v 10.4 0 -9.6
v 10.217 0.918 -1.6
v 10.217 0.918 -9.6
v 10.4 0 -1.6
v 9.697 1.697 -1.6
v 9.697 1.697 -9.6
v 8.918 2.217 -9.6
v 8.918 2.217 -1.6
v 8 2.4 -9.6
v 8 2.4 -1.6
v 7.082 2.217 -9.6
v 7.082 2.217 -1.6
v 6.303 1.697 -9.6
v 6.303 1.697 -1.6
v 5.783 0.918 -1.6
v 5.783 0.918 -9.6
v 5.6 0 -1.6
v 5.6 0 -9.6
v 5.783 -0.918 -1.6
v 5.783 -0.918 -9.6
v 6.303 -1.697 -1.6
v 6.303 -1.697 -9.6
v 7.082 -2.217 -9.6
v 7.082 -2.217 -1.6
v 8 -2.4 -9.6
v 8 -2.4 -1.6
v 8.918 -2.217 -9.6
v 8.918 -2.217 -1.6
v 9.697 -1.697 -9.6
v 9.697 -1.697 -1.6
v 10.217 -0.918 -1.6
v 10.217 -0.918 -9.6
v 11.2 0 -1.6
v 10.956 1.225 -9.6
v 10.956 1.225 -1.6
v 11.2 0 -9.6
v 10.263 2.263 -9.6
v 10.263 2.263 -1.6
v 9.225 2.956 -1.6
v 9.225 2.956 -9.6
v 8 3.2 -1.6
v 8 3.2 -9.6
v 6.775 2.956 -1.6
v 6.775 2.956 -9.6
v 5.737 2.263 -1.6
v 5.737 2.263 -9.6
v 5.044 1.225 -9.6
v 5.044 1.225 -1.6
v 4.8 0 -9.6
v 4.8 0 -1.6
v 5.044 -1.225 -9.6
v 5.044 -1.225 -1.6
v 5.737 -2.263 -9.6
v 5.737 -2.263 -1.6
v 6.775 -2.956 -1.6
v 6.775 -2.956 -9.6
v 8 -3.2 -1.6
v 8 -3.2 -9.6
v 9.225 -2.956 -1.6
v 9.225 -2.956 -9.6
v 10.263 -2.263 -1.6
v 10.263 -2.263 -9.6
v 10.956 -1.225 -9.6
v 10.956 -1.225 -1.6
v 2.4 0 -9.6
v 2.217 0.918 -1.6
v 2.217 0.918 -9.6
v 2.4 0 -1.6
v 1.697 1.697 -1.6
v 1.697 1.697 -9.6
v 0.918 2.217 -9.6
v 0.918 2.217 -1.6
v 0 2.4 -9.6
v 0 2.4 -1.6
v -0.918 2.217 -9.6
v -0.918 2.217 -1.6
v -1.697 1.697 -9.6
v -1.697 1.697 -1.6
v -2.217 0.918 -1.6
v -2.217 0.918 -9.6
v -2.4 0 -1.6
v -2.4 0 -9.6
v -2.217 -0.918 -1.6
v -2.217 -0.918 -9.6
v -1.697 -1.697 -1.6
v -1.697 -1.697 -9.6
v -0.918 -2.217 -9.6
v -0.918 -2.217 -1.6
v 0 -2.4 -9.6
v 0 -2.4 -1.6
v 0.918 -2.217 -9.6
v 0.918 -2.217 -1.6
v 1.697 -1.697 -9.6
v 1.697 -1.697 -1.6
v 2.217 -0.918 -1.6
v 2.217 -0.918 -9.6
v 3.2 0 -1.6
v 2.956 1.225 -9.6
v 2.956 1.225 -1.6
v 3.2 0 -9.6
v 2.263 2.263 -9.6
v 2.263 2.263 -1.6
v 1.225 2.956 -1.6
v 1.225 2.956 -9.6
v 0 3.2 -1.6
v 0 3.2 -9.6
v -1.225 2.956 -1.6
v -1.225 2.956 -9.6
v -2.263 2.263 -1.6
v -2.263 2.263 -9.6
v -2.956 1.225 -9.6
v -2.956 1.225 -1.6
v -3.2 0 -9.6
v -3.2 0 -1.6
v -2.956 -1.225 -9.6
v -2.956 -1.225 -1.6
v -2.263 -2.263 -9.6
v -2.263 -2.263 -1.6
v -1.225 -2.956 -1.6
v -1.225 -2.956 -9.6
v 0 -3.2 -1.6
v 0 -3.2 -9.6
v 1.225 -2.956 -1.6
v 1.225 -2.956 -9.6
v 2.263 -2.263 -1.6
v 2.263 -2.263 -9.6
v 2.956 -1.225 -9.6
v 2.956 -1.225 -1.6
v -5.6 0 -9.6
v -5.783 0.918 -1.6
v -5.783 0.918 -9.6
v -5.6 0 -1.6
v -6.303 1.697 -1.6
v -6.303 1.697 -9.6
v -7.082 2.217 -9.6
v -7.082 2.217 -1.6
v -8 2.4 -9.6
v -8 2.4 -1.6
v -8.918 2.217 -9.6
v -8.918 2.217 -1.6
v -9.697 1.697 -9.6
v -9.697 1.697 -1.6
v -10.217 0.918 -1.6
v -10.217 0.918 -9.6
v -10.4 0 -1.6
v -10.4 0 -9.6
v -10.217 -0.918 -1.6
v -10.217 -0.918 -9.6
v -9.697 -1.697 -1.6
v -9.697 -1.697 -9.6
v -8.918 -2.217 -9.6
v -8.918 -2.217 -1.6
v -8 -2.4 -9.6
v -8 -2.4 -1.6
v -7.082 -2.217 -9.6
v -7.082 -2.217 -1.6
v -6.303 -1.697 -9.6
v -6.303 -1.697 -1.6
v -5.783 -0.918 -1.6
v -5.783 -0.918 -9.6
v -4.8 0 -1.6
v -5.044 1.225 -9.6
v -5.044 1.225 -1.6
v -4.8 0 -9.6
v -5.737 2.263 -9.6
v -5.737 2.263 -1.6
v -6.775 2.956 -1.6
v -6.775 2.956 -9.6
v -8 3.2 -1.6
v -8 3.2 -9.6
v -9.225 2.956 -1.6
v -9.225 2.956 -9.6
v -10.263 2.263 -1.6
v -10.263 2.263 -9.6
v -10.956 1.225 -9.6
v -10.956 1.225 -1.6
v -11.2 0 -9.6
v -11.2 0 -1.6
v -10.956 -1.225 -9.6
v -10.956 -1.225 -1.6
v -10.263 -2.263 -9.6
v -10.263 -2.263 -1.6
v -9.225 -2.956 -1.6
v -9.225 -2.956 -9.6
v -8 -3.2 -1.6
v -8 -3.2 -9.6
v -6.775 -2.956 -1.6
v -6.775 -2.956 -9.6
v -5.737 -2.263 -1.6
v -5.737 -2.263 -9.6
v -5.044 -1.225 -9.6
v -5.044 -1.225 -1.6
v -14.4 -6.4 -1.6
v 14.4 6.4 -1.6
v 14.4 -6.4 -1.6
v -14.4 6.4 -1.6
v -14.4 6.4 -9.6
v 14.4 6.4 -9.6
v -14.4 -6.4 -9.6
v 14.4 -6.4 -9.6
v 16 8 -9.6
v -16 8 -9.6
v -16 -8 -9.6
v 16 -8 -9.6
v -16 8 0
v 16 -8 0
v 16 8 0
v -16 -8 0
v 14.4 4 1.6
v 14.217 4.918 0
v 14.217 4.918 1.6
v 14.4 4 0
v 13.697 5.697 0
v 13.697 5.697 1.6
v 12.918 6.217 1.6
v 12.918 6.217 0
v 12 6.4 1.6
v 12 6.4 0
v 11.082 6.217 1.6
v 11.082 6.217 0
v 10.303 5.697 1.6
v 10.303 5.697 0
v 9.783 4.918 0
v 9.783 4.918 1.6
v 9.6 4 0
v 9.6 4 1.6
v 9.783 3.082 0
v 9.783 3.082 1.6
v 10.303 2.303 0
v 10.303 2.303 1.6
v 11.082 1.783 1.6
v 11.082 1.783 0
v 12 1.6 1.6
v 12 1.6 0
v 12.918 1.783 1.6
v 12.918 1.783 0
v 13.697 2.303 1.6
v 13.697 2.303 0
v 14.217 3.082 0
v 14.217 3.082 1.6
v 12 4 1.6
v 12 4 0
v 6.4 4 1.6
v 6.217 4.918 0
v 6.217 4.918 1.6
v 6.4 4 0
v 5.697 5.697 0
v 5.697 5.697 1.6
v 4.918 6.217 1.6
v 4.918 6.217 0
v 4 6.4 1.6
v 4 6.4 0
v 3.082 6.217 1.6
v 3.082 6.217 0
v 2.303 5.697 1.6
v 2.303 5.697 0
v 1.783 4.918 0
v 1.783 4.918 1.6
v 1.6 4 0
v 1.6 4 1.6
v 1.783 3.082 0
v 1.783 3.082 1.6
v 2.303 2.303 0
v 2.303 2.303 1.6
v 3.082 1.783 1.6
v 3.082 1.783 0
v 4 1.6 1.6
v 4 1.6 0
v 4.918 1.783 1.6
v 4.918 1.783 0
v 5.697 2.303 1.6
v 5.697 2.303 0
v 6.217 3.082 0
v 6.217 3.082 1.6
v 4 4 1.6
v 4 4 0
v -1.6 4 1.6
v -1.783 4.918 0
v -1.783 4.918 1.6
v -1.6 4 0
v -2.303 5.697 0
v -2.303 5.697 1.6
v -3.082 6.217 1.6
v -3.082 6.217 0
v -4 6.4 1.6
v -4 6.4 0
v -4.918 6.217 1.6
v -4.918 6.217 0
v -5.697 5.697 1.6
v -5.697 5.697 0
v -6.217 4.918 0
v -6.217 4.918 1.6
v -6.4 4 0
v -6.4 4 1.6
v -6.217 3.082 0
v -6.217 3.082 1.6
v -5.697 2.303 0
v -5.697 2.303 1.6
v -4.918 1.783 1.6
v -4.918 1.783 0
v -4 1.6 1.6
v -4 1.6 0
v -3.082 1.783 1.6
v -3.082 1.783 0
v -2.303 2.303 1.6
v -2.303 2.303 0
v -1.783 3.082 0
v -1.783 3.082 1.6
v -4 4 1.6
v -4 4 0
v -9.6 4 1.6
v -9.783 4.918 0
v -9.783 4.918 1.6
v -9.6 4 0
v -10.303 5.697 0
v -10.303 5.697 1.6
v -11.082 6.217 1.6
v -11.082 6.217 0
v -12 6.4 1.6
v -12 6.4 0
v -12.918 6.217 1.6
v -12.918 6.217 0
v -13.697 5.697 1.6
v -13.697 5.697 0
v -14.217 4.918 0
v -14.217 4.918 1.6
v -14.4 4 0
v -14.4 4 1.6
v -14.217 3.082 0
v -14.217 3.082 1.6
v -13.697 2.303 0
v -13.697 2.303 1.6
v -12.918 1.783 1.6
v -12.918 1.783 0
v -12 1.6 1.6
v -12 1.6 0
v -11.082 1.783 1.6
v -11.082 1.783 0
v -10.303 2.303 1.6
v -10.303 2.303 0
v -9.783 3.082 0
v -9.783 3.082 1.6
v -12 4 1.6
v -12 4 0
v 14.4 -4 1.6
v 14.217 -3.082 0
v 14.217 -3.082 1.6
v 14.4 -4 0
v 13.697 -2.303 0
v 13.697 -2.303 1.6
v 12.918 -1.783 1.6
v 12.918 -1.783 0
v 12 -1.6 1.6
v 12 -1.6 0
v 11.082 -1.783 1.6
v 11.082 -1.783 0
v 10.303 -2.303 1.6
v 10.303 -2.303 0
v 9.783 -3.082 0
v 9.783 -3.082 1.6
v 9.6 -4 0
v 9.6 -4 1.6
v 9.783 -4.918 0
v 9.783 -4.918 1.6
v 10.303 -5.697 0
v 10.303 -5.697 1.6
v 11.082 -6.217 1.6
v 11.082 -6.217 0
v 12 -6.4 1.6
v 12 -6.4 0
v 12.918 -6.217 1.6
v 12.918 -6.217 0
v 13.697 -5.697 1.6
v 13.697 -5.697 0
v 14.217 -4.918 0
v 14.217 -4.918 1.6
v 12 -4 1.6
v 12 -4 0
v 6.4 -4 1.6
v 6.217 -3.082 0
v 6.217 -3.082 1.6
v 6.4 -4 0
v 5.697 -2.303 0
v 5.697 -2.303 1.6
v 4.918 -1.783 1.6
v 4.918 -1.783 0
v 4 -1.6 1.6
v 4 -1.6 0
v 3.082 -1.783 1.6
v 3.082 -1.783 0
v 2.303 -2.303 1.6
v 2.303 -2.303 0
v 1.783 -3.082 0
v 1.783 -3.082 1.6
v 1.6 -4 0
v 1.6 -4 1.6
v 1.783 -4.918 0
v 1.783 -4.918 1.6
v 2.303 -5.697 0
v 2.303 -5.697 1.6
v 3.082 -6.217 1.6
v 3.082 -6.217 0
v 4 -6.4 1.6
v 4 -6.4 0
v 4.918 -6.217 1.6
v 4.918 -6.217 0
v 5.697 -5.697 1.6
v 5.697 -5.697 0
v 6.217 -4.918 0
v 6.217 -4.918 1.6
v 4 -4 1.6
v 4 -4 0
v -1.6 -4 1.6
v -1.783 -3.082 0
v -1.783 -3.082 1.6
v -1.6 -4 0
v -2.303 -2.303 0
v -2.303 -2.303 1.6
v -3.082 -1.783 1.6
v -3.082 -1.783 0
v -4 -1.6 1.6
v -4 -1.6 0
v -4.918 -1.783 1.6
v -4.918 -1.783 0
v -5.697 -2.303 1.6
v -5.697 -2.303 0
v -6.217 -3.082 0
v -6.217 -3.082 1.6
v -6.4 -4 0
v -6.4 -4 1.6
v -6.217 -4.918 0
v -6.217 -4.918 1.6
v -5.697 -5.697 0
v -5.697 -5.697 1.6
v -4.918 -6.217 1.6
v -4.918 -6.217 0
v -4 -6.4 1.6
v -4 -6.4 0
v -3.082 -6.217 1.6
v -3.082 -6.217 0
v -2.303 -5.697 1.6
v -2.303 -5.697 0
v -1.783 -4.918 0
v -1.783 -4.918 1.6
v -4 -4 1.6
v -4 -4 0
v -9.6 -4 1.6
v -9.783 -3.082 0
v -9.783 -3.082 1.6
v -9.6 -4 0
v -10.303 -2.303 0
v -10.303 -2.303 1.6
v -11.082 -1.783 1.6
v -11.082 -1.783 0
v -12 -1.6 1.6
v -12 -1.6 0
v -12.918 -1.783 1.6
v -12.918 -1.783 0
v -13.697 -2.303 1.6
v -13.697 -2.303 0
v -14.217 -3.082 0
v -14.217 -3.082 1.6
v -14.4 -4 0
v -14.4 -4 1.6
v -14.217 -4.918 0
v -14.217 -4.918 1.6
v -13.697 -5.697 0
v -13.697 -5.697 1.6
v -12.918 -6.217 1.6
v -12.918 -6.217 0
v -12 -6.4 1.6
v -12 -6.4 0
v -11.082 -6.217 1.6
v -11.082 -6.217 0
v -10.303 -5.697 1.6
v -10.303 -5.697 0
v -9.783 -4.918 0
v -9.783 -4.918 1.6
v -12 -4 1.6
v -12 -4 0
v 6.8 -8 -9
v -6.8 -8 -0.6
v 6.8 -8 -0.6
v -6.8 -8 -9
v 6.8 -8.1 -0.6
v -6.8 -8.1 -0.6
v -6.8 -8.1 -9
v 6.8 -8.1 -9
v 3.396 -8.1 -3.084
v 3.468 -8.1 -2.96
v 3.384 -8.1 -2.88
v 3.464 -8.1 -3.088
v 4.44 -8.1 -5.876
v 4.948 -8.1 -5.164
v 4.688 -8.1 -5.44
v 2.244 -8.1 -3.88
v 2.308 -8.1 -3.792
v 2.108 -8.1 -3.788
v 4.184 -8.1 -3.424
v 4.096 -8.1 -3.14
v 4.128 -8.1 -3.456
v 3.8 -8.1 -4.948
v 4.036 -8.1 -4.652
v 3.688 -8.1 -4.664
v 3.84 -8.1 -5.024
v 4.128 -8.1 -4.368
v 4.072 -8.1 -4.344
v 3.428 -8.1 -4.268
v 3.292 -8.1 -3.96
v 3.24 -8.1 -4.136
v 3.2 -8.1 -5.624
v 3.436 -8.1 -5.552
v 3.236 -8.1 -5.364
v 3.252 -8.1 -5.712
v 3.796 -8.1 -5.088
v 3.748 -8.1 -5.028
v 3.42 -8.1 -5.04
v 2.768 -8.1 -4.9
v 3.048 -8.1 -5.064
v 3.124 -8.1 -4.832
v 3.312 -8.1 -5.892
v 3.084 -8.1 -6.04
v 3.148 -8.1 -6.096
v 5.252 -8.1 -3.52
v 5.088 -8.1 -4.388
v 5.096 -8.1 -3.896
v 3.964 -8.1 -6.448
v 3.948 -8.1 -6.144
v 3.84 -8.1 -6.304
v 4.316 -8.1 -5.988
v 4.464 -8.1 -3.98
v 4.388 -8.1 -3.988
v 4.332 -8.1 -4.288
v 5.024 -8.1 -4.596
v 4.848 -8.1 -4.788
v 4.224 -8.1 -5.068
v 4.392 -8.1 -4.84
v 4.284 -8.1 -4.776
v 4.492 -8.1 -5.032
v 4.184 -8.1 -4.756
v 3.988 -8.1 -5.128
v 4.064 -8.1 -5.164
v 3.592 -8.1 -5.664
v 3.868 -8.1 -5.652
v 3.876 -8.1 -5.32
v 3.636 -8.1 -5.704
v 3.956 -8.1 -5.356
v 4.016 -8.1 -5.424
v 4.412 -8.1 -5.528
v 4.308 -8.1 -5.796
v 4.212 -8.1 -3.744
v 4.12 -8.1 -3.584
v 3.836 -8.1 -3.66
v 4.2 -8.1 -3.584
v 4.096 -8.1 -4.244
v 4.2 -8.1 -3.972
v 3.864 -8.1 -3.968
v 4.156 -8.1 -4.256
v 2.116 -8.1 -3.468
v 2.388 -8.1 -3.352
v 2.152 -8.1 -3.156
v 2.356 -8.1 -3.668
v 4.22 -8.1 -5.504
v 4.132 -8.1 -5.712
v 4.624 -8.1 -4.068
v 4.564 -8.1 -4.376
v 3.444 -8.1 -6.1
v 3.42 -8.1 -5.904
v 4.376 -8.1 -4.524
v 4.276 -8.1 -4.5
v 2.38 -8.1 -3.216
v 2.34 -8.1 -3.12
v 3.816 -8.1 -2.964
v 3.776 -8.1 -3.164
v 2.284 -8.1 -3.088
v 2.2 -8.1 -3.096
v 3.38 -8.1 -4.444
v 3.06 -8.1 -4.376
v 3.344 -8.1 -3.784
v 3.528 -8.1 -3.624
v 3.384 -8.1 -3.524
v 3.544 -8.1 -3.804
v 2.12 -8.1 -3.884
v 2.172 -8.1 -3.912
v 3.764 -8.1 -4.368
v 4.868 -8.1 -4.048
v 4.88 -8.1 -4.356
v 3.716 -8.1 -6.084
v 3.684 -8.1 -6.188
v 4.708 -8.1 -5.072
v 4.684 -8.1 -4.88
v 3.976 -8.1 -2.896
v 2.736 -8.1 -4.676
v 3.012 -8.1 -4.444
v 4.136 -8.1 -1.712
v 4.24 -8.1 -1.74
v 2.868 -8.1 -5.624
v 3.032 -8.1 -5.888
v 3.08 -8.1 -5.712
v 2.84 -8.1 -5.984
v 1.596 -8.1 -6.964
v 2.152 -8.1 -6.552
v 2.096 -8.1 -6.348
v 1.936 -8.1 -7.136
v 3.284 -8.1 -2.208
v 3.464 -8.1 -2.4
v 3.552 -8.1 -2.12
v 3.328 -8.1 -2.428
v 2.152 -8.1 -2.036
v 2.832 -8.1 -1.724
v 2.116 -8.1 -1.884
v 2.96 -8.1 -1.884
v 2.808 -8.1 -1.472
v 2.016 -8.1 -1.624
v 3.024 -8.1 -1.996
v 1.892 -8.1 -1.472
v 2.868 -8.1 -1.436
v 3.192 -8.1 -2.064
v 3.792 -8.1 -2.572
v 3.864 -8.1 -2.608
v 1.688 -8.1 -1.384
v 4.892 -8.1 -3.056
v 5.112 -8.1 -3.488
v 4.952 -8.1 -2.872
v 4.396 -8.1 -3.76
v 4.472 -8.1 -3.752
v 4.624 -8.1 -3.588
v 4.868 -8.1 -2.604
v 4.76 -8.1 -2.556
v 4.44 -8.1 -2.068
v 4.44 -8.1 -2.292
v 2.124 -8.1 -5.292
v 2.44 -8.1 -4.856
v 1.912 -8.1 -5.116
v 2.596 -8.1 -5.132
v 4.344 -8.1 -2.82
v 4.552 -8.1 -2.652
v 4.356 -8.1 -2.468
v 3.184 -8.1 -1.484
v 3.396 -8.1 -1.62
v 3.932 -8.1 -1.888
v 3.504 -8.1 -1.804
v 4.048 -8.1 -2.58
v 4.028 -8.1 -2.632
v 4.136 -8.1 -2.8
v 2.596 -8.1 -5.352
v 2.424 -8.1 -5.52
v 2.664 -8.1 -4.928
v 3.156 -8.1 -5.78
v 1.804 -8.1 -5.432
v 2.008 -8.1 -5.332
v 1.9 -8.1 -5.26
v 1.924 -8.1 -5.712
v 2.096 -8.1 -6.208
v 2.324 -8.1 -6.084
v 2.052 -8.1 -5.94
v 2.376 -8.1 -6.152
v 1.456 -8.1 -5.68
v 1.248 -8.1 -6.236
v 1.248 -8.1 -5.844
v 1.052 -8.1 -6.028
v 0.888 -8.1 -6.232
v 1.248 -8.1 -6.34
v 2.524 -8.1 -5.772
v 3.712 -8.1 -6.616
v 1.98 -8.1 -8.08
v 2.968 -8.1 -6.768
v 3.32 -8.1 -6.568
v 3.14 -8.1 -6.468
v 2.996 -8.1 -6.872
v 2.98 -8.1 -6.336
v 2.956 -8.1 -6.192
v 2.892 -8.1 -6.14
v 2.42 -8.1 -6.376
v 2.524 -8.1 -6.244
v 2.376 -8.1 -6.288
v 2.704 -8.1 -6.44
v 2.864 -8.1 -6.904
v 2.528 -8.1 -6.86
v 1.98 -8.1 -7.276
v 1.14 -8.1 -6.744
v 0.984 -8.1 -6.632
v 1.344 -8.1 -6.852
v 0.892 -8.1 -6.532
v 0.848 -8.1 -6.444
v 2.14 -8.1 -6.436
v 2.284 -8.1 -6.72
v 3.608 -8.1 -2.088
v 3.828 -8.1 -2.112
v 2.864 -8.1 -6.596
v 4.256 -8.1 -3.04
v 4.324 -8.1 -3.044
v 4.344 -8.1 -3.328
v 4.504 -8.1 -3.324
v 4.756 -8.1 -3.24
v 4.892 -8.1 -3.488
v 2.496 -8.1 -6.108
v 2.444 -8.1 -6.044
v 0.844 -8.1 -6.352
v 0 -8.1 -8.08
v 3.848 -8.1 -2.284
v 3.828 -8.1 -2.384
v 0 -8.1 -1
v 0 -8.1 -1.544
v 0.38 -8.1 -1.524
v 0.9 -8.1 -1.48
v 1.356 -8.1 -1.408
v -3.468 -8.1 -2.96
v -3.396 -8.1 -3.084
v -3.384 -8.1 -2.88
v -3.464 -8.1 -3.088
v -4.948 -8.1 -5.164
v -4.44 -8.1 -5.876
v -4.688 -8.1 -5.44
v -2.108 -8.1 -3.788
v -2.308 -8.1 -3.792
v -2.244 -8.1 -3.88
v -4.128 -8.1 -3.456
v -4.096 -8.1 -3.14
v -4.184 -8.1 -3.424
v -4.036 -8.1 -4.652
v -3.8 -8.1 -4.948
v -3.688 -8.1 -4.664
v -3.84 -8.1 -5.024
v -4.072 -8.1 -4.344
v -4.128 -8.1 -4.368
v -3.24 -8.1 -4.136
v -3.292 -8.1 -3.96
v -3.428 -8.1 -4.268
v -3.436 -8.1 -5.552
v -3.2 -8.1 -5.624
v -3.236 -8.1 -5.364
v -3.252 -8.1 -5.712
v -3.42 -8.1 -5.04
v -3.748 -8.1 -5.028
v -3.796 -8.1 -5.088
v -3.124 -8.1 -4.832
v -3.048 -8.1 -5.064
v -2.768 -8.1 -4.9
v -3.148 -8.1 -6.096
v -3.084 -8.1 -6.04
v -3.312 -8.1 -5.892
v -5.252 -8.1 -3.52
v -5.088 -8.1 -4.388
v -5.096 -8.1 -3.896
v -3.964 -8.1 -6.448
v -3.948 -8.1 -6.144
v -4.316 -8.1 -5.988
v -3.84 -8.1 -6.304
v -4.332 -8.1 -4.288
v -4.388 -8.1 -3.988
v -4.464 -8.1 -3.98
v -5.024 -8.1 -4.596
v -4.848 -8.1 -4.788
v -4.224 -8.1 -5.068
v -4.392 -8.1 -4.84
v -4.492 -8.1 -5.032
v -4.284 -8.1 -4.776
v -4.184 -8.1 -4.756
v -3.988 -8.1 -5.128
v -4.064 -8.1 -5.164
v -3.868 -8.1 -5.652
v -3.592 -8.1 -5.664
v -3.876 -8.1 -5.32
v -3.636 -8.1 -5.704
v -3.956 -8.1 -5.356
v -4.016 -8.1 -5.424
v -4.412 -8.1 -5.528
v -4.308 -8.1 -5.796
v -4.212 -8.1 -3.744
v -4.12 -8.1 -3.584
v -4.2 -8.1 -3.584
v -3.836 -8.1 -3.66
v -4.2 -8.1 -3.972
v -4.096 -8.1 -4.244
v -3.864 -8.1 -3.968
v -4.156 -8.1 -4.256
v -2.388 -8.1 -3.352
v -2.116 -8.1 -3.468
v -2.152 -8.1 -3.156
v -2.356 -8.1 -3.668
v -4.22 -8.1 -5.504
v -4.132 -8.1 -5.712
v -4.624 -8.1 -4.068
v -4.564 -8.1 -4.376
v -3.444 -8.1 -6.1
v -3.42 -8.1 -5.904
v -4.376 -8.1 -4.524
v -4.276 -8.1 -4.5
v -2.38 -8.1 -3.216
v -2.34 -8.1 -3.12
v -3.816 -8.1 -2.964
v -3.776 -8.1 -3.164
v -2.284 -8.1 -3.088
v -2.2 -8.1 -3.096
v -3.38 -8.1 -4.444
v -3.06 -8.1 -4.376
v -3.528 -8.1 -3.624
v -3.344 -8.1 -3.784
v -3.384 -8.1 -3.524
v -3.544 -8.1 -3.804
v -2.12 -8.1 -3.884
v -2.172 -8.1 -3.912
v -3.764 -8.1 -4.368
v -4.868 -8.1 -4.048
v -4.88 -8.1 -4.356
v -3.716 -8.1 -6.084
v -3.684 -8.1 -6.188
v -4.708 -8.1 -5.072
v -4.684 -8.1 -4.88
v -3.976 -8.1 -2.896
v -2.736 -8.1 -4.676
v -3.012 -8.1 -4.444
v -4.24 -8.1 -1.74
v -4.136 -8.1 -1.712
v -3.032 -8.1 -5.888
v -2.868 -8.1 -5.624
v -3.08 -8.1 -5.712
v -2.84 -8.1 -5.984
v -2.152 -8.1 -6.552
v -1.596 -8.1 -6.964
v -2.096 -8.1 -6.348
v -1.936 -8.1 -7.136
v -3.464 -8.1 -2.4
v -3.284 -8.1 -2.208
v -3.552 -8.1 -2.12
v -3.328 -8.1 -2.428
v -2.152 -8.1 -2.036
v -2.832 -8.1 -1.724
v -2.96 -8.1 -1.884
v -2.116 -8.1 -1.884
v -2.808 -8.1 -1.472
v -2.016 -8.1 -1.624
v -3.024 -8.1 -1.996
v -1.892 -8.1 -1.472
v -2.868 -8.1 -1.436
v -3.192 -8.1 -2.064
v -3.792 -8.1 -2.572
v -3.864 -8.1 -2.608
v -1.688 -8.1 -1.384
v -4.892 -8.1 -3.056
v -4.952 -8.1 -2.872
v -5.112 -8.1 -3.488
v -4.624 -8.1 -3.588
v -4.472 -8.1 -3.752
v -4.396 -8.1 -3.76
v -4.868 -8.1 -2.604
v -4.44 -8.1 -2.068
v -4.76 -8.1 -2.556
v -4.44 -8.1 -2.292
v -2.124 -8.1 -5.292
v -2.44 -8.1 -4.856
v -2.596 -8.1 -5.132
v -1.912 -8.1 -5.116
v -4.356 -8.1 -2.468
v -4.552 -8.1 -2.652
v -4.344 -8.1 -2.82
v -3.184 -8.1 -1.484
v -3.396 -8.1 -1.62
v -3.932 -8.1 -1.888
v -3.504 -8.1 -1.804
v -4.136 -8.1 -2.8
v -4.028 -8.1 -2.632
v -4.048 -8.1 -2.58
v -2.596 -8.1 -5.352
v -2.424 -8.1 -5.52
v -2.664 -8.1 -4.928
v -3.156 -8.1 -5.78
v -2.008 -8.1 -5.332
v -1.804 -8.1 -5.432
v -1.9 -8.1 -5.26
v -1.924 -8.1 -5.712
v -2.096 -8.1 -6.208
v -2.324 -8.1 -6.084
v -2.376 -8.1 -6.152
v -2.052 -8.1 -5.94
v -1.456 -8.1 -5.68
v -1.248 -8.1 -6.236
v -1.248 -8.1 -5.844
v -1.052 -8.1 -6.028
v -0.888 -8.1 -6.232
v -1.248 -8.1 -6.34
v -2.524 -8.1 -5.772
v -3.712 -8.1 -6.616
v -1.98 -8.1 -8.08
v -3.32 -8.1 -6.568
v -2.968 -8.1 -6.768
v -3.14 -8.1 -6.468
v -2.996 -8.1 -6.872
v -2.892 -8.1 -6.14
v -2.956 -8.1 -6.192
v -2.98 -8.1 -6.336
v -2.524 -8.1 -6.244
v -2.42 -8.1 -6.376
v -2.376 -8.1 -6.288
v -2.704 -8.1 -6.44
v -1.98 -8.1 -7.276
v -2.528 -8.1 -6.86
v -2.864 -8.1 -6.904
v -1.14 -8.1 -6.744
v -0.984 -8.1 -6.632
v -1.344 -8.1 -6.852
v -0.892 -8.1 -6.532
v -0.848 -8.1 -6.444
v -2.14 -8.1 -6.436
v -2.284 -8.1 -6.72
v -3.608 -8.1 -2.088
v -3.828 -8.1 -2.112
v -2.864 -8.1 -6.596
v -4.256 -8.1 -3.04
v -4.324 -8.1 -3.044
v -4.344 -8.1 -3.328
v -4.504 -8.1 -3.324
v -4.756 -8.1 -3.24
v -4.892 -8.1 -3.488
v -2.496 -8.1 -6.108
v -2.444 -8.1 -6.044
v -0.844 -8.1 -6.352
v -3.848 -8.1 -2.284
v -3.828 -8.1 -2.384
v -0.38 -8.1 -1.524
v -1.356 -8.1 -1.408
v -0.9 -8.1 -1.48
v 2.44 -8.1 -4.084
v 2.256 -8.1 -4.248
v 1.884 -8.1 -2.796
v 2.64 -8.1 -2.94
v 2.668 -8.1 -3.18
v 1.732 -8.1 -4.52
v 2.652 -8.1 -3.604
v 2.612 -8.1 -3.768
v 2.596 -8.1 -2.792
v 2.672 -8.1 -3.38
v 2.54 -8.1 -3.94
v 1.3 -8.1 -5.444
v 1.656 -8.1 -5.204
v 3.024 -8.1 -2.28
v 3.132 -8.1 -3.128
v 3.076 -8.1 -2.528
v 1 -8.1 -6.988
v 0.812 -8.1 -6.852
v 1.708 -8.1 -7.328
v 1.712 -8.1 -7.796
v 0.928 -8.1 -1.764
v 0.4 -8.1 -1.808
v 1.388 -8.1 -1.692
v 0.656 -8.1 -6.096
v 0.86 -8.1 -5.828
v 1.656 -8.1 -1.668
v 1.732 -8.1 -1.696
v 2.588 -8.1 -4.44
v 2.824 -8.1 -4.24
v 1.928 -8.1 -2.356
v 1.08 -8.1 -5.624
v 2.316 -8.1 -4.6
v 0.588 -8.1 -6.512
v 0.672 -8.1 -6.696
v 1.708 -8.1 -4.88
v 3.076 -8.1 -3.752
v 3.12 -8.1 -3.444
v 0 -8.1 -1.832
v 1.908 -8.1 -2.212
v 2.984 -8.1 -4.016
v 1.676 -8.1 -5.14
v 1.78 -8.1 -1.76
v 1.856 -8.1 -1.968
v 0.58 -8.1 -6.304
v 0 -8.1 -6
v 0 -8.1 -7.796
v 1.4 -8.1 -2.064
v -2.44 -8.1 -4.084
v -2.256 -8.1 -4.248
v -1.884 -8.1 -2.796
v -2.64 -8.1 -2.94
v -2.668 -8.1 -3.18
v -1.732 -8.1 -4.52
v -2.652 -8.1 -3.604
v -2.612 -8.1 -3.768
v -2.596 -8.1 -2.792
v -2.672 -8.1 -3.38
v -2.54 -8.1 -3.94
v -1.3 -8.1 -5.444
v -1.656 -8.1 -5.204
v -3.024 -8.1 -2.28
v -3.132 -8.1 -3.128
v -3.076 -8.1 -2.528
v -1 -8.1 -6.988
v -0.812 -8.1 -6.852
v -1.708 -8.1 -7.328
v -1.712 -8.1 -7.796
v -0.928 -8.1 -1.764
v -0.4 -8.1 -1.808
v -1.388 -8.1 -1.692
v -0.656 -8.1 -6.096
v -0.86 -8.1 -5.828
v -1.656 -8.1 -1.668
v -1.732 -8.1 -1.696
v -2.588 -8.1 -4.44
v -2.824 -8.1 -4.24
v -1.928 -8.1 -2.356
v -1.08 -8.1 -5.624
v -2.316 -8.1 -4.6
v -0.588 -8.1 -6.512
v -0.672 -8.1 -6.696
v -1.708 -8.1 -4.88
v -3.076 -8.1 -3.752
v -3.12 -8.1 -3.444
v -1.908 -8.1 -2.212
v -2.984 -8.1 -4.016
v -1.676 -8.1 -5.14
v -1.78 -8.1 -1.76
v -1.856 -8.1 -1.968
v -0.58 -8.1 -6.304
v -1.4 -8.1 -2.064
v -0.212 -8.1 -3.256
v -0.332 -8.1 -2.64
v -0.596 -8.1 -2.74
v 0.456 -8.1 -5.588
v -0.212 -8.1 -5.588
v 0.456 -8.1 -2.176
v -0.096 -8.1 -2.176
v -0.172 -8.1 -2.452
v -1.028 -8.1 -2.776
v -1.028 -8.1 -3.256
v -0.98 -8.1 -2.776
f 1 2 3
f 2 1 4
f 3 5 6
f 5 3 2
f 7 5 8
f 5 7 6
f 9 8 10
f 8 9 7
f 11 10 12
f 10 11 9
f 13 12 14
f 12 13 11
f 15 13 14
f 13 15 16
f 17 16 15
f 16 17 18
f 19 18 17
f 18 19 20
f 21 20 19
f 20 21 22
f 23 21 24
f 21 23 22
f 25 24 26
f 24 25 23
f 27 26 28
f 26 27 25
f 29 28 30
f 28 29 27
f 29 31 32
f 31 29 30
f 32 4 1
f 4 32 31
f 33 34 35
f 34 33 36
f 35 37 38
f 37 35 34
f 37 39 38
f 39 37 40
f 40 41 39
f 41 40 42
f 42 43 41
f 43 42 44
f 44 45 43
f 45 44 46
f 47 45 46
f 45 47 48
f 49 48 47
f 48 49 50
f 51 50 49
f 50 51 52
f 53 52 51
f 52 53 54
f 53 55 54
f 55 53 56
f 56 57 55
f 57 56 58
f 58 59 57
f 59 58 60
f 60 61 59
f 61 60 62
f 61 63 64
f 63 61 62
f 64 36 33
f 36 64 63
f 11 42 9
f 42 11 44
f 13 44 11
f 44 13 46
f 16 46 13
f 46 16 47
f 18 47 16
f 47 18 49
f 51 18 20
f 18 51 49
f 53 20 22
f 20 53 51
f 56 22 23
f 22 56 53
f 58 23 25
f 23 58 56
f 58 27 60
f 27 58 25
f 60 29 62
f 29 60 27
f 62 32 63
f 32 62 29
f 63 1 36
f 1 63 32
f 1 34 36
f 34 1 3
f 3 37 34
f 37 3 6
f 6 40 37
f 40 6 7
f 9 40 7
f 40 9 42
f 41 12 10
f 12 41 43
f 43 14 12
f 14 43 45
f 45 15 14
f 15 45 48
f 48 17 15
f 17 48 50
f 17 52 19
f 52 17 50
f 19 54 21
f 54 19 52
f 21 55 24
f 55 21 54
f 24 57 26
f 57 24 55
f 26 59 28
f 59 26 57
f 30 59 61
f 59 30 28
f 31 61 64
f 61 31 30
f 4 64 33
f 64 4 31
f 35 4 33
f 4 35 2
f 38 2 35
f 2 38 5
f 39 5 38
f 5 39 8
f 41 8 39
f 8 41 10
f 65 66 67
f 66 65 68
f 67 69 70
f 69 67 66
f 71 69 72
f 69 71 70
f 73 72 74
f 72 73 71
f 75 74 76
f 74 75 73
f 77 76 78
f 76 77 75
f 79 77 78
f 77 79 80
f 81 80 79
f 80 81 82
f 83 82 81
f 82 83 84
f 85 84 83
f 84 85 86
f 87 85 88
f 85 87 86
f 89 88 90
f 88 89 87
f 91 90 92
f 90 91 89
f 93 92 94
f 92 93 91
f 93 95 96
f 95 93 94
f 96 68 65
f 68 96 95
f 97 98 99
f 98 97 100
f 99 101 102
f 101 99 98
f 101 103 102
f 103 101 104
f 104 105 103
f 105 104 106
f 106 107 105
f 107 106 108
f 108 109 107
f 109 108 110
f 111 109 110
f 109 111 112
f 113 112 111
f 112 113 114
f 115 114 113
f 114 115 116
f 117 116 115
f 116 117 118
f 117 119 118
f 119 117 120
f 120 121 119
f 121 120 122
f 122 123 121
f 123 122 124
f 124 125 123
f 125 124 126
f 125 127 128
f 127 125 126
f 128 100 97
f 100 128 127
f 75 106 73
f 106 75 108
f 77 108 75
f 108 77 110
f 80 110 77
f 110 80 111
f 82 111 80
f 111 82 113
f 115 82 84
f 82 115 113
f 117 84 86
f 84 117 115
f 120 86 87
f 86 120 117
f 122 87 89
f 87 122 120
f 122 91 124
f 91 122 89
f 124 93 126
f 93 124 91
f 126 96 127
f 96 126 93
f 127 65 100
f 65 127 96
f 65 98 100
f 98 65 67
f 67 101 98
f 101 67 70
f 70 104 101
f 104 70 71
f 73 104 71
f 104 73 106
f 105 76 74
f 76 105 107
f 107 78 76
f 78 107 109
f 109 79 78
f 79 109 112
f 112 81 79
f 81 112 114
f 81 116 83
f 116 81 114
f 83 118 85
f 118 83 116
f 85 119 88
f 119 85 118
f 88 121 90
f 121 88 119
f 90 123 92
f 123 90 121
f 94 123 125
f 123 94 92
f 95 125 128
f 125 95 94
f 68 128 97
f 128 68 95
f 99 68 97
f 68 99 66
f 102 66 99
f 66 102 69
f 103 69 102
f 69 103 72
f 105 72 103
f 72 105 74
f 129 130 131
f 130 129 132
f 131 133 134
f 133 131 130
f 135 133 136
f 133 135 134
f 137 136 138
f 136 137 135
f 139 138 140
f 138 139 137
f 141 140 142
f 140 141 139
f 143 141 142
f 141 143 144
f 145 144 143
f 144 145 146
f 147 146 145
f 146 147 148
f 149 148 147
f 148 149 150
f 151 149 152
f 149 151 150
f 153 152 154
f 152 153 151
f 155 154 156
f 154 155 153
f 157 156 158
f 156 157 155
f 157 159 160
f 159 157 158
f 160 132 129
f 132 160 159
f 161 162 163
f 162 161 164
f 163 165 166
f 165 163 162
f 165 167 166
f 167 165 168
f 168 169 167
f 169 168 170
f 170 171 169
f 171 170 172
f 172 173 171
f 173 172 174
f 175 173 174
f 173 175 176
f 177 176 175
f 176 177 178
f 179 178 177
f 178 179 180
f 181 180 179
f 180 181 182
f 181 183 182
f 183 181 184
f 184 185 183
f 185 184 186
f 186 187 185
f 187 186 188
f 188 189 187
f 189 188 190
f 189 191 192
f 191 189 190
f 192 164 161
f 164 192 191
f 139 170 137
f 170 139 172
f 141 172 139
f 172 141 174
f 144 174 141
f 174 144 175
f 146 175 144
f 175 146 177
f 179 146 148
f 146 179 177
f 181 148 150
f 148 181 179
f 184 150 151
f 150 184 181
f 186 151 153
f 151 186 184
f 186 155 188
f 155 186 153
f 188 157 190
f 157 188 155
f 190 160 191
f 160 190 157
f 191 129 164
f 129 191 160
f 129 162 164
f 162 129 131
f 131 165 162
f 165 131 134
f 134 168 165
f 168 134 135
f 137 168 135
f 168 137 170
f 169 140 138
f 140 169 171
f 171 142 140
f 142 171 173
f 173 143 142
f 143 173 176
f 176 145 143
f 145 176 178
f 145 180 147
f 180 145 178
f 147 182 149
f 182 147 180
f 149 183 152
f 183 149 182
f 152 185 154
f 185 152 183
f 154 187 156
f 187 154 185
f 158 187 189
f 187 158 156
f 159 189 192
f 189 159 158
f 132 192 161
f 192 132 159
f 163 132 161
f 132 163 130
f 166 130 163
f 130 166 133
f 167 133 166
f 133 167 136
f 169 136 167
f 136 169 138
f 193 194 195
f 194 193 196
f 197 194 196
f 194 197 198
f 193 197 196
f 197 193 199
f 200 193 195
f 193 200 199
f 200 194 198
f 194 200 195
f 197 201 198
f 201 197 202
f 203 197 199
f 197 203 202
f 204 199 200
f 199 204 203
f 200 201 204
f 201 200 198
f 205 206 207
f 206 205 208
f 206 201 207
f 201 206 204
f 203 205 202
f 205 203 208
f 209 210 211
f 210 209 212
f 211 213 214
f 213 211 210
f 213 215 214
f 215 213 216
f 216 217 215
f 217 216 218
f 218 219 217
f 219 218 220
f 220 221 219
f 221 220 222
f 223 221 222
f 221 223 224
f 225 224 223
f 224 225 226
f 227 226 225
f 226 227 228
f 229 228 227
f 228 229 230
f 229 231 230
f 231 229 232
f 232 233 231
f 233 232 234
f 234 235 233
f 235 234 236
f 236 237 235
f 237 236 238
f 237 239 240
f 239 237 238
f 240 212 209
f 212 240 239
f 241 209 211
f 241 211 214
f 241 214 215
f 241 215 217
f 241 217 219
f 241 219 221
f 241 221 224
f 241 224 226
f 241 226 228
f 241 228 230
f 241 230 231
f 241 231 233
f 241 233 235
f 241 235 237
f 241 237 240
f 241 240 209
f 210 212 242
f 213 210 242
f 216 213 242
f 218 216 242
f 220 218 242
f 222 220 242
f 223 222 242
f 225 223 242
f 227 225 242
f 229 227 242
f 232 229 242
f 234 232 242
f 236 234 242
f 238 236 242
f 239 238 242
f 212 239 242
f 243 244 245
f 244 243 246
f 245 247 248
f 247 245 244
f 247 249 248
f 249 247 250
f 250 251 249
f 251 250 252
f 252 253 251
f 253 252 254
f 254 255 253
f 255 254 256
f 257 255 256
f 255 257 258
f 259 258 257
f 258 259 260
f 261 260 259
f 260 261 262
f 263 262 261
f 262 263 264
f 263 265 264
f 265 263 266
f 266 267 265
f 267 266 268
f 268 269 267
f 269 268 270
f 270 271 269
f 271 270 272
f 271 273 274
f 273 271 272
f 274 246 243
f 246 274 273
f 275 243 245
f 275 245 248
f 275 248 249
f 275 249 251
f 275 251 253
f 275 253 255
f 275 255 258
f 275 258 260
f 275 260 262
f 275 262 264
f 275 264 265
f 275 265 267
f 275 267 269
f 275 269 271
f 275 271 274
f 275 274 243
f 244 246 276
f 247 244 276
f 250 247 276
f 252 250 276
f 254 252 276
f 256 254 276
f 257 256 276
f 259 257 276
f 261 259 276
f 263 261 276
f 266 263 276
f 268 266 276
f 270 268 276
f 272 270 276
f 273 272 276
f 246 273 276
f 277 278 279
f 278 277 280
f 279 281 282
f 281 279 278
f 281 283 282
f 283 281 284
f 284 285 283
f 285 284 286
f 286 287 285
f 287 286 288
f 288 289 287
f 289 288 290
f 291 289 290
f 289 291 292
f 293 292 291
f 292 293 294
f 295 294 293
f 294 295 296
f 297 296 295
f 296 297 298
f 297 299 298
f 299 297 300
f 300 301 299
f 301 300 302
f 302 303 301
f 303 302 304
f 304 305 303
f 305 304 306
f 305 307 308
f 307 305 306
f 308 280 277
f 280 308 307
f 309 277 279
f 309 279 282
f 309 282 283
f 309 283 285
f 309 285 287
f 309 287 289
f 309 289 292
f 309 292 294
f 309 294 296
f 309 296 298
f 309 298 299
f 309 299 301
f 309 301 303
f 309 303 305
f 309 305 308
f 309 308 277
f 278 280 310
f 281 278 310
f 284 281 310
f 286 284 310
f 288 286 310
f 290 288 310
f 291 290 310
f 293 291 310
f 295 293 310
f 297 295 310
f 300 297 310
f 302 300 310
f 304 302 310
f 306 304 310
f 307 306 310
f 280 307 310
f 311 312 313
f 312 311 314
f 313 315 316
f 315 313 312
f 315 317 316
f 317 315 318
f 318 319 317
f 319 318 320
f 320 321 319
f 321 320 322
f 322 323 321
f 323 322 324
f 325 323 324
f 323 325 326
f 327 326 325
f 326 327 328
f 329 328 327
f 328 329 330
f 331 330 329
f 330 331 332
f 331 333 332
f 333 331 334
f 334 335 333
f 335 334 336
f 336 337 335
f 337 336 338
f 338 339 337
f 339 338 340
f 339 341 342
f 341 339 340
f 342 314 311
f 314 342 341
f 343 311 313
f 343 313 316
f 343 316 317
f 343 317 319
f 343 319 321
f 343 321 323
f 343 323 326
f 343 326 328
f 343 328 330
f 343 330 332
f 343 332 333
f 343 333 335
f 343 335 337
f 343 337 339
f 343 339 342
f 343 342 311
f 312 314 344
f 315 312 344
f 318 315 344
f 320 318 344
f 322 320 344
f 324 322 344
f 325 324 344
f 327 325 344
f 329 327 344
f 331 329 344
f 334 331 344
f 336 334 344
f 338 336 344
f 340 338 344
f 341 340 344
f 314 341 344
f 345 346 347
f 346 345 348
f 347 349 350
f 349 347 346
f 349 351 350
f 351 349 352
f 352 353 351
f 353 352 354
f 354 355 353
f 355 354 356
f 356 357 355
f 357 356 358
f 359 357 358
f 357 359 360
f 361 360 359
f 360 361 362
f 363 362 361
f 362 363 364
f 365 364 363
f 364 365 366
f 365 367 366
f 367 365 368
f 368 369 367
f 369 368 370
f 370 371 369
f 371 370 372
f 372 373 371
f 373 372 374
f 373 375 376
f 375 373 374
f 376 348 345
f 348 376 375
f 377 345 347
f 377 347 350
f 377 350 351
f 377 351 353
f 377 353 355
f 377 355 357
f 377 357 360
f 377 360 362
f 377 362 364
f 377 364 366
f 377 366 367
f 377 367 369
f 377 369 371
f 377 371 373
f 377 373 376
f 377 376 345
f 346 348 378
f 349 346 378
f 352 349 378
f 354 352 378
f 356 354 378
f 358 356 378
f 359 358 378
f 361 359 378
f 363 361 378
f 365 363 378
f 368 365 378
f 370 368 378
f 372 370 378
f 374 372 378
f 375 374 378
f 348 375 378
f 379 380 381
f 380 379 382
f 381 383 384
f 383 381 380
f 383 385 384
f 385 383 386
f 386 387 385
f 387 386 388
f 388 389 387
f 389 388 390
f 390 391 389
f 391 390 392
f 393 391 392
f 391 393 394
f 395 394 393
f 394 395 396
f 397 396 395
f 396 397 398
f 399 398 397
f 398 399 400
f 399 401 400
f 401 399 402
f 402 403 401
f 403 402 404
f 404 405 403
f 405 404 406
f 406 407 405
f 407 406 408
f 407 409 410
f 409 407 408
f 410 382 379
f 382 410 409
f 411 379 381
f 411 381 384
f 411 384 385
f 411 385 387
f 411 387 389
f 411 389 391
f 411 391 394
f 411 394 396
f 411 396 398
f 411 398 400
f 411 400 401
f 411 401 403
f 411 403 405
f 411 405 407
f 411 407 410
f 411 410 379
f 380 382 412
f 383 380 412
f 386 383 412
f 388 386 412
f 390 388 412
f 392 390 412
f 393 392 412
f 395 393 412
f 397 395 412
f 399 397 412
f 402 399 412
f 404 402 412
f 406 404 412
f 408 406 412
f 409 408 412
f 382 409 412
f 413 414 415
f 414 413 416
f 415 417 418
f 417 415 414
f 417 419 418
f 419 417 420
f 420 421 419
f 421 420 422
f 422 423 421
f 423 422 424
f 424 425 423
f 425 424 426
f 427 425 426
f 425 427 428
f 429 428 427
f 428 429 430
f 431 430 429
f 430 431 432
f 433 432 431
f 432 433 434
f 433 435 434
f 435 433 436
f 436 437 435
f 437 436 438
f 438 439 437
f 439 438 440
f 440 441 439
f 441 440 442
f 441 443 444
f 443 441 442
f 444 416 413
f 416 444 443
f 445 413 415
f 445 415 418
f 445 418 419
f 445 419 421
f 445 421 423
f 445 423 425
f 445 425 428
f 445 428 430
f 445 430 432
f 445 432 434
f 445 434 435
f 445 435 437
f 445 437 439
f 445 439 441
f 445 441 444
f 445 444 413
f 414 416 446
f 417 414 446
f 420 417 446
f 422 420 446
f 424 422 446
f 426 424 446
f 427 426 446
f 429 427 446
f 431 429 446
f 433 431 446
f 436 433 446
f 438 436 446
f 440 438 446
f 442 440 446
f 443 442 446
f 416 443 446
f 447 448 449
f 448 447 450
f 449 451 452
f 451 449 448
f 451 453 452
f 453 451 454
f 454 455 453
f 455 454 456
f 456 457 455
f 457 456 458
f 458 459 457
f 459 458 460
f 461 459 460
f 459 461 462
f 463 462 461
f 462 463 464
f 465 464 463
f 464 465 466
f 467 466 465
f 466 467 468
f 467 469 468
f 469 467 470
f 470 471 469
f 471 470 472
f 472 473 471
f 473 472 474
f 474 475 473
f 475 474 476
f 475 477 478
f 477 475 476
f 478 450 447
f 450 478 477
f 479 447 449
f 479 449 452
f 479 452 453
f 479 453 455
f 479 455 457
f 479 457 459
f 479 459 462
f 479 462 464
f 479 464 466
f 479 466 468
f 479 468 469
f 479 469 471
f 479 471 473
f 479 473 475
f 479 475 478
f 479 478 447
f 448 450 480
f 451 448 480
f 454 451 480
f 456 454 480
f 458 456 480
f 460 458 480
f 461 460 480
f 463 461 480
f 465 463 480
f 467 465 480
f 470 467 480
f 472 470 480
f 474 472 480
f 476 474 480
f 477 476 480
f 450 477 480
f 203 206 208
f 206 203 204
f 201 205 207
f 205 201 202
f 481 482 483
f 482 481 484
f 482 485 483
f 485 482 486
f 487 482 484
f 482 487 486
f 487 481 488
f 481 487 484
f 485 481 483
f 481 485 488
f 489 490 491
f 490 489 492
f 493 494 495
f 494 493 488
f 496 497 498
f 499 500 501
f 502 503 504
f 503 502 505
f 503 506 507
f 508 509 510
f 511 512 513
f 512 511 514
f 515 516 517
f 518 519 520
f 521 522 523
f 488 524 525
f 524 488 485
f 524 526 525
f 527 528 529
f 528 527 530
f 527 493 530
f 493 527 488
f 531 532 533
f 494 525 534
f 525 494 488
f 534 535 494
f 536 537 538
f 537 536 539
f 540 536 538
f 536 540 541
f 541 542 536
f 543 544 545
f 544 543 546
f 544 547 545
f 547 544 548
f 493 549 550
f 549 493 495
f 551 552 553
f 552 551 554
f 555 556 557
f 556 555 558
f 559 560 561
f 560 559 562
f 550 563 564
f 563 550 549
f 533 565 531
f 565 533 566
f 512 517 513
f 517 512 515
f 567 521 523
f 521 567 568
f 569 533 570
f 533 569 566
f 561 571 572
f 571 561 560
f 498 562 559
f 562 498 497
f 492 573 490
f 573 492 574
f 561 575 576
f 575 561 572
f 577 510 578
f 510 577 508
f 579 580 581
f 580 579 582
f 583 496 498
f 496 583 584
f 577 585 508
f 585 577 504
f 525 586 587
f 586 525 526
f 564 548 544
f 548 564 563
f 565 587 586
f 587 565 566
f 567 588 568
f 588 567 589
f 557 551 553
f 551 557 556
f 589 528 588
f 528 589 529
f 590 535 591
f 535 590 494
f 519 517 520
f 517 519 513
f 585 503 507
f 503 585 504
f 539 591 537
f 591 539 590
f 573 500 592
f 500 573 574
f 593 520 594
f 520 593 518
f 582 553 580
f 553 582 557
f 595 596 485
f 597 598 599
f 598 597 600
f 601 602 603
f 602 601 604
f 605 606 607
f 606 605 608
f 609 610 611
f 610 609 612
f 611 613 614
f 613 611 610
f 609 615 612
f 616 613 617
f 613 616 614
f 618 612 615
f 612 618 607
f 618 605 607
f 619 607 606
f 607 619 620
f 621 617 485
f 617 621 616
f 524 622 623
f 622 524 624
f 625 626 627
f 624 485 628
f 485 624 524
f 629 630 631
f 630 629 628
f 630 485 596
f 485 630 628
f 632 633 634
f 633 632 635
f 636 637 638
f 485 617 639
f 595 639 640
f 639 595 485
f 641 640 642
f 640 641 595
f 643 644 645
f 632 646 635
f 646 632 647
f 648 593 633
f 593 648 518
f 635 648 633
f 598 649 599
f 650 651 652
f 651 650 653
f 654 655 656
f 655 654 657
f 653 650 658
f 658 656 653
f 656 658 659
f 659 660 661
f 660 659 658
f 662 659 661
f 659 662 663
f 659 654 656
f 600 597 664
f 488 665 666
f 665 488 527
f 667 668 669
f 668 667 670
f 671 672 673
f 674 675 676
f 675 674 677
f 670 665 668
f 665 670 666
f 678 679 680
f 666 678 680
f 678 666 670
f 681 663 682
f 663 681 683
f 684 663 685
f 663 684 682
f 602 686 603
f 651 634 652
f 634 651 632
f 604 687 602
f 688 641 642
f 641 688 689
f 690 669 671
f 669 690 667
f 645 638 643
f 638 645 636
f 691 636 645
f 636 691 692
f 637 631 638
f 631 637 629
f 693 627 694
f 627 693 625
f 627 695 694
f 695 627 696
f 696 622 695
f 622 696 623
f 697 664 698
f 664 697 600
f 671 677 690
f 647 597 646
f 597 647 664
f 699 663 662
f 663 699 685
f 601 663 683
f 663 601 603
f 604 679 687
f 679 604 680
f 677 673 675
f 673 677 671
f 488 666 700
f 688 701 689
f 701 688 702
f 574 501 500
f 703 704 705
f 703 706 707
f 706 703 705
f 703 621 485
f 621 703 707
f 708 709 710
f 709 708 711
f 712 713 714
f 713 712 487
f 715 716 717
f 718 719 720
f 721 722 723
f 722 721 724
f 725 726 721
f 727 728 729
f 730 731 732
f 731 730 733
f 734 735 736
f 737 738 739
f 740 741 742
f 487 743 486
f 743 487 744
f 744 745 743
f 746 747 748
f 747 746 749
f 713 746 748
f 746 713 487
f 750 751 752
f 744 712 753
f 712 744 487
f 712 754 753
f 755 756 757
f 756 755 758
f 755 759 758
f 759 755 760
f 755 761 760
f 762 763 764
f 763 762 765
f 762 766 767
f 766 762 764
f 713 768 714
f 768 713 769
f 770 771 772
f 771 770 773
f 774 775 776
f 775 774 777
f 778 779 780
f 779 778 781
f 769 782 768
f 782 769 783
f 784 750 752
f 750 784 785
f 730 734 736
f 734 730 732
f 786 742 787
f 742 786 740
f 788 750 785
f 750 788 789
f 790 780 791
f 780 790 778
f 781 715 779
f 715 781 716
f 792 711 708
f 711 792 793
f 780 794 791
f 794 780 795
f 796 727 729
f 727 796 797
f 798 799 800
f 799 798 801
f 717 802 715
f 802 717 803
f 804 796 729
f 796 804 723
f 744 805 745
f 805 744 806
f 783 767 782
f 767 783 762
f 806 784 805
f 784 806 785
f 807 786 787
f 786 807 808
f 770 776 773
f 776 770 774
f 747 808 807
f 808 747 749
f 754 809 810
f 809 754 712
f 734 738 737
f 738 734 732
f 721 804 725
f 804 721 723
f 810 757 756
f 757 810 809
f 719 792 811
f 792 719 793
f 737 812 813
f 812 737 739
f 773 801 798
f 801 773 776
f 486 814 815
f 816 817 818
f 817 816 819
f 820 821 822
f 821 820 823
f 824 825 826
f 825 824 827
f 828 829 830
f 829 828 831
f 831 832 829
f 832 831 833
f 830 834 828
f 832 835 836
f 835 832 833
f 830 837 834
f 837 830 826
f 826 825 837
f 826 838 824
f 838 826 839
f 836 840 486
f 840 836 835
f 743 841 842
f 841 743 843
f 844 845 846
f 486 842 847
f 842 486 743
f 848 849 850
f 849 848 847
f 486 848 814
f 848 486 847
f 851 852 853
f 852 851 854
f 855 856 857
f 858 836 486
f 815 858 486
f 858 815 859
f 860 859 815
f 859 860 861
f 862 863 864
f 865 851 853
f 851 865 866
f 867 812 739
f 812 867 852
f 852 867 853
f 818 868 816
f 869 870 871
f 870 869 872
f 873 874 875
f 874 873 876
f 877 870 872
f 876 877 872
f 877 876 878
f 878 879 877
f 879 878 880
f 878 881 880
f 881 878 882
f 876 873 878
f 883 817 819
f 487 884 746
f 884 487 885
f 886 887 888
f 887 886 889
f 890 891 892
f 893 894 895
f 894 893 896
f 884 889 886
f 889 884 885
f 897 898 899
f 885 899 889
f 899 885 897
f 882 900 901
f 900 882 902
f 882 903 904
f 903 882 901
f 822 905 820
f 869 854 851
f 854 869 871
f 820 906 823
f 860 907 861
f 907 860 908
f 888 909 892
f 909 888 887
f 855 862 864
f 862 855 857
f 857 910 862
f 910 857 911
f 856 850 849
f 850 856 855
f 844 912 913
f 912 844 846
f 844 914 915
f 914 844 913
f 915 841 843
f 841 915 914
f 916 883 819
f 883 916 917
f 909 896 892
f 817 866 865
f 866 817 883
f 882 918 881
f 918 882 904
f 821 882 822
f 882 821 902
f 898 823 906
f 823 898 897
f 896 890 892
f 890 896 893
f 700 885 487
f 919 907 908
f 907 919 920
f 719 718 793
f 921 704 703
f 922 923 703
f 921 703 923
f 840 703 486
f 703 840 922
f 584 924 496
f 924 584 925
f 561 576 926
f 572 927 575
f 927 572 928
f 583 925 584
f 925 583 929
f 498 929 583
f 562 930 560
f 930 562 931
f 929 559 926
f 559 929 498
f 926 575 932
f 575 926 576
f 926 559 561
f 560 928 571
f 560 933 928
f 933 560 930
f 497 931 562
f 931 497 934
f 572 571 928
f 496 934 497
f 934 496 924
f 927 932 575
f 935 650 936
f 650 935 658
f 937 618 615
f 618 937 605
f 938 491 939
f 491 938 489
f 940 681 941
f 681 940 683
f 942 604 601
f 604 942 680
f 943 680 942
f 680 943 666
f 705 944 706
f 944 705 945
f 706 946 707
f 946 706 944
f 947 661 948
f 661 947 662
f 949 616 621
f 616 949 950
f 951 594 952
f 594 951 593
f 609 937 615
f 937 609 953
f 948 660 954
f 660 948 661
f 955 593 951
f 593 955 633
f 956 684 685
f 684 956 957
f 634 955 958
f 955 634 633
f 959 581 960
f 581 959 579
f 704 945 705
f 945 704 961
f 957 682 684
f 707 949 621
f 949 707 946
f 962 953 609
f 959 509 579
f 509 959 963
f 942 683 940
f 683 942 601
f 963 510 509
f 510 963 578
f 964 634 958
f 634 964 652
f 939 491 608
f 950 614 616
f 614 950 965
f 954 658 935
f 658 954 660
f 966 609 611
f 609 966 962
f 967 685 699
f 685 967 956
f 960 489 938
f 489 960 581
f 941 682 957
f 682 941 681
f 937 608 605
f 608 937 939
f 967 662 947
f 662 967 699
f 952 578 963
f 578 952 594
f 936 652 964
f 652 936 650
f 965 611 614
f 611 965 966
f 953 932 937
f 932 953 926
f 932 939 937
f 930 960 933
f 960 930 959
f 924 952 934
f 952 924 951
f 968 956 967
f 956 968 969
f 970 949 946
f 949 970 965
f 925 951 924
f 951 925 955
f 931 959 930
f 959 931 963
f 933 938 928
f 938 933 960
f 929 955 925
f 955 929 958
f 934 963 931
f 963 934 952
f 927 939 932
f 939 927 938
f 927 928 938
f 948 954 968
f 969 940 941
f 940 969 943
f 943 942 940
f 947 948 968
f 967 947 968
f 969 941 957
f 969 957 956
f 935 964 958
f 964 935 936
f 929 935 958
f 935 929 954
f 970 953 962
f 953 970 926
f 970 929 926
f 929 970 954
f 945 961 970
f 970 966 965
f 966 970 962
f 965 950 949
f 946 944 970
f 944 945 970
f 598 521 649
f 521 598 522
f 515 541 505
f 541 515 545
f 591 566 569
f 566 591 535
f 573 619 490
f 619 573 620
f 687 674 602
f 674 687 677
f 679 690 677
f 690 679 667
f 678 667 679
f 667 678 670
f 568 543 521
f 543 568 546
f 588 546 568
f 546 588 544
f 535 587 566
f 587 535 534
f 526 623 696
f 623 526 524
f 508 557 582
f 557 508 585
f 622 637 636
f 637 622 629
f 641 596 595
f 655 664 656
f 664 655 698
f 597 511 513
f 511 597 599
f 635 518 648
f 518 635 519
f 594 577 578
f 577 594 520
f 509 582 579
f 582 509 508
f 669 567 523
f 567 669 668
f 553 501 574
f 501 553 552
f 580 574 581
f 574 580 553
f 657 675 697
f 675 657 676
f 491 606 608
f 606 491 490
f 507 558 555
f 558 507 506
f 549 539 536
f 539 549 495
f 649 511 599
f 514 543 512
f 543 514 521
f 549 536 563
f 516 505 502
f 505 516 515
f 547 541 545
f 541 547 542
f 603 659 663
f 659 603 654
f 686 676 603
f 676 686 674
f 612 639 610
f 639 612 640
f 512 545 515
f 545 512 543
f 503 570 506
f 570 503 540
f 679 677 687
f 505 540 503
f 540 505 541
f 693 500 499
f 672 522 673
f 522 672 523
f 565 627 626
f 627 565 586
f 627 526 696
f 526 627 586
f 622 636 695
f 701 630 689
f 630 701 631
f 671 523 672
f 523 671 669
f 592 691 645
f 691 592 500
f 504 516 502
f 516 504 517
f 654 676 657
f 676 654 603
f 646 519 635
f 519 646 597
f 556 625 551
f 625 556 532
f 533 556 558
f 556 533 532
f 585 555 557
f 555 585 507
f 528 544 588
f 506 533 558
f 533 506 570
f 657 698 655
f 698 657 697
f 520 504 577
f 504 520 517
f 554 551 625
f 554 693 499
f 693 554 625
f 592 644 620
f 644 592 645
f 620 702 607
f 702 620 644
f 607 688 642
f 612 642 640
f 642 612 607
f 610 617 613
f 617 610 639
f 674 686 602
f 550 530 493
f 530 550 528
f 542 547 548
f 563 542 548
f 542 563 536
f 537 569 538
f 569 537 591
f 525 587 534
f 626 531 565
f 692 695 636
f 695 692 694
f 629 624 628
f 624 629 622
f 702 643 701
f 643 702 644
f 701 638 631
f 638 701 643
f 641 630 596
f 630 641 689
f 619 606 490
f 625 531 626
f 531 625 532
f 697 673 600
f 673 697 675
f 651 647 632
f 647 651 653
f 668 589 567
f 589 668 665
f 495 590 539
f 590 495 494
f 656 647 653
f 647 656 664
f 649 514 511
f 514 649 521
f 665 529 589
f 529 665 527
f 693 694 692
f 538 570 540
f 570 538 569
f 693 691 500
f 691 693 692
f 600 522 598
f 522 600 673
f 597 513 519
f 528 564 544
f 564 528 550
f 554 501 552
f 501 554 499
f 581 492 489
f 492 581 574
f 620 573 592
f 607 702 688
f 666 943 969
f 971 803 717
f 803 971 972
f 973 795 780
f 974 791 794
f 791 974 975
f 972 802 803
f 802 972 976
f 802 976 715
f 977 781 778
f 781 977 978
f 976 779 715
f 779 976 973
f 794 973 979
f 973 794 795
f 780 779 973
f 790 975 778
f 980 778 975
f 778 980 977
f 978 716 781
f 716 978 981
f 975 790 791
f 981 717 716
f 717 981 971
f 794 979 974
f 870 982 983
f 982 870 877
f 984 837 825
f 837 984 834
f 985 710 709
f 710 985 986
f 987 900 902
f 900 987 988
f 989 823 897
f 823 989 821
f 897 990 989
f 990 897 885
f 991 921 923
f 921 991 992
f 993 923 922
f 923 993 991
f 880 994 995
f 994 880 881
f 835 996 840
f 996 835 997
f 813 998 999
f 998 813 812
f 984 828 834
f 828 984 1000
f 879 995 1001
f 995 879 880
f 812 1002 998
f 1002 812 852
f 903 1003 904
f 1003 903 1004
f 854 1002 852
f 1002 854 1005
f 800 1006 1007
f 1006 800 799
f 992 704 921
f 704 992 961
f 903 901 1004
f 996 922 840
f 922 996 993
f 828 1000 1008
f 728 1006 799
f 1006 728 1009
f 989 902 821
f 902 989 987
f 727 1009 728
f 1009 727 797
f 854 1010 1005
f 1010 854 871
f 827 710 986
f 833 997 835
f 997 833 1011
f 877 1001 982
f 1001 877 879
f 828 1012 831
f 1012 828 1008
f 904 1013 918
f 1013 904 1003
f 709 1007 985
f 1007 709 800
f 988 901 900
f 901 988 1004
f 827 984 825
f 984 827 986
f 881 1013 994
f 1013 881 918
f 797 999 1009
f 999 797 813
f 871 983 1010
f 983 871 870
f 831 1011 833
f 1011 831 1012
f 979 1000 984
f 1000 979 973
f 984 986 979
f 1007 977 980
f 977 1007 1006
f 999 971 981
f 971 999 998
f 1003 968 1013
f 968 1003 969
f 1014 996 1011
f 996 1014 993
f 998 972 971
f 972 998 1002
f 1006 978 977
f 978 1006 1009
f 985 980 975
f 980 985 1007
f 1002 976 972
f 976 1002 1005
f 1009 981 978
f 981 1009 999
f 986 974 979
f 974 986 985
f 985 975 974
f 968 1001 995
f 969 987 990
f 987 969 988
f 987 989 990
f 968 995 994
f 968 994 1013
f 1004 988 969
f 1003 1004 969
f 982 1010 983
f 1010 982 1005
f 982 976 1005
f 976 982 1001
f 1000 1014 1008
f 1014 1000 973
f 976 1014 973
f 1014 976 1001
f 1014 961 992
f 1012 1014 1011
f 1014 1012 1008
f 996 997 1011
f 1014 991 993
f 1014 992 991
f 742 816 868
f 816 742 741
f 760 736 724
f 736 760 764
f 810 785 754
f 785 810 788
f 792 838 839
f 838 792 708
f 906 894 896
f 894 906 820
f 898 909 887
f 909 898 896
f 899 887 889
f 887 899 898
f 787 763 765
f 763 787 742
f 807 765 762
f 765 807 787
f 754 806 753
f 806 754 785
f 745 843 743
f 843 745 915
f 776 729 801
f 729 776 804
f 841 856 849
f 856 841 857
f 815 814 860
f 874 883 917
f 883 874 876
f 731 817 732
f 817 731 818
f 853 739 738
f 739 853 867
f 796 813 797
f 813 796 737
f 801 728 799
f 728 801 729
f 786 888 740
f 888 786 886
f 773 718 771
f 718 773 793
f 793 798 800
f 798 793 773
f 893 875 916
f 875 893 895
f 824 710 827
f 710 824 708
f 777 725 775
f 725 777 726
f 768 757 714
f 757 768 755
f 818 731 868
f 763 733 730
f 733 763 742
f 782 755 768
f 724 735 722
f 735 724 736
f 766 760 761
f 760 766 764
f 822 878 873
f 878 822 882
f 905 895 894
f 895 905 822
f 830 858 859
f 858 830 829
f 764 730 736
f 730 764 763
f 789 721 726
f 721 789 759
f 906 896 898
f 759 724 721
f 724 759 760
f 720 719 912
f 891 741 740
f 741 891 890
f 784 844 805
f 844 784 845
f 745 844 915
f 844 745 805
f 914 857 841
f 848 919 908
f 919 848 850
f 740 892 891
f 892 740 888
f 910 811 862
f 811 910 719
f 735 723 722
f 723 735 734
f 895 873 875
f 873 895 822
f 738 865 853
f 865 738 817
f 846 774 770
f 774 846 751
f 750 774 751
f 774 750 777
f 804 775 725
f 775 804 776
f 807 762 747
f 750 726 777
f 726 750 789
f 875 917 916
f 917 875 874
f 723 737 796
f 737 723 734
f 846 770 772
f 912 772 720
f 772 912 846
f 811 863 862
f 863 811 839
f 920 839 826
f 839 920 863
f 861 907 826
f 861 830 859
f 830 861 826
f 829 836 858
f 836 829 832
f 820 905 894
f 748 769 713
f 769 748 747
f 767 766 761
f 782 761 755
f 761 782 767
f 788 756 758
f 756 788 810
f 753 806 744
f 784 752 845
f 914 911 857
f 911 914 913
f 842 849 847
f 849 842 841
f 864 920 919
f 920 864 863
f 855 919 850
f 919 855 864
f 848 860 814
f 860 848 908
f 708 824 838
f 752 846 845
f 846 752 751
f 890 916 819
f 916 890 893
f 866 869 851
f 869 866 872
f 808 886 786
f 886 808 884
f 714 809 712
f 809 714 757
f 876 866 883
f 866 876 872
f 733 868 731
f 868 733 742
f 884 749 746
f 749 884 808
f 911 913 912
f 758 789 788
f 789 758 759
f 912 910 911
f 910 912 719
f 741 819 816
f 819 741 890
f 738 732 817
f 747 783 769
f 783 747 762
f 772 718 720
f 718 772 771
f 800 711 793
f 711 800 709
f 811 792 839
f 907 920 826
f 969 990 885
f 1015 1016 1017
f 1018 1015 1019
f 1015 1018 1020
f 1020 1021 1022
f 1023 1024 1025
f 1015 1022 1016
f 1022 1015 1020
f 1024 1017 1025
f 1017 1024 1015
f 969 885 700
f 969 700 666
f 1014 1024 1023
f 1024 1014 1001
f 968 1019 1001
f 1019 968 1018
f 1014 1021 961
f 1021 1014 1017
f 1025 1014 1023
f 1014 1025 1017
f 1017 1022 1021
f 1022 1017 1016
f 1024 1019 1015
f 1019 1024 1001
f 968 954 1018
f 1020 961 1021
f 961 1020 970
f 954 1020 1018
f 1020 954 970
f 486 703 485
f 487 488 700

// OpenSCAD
use <../lib.scad>
use <3001.scad>
use <821435i.scad>
function ldraw_lib__3001d0d() = [
// 0 Brick  2 x  4 with Black Number "1" on Yellow Trophy Cup and Laurels Sticker
// 0 Name: 3001d0d.dat
// 0 Author: Takeshi Takahashi [RainbowDolphin]
// 0 !LDRAW_ORG Shortcut UPDATE 2025-10
// 0 !LICENSE Licensed under CC BY 4.0 : see CAreadme.txt
// 
// 0 BFC CERTIFY CCW
  [0,"BFC","CERTIFY"],
  [0,"BFC","CCW"],
// 
// 0 !CATEGORY Sticker Shortcut
// 
// 0 !KEYWORDS Bricklink 3001pb075, Racing, Set 6539, Victory cup racers
// 
// 0 !HISTORY 2025-10-27 [OrionP] Official Update 2025-10
// 
// 1 16 0 0 0 1 0 0 0 1 0 0 0 1 3001.dat
  [1,16,0,0,0,1,0,0,0,1,0,0,0,1, ldraw_lib__3001()],
// 1 16 0 12 -20 1 0 0 0 0 -1 0 1 0 821435i.dat
  [1,16,0,12,-20,1,0,0,0,0,-1,0,1,0, ldraw_lib__821435i()],
];
module ldraw_lib__3001d0d(step=0, col=false, unit=2/5, alt=false, line=0.2, solid=!$preview)
    makepoly(ldraw_lib__3001d0d(), step=step, col=col, unit=unit, alt=alt, line=line, solid=solid);
ldraw_lib__3001d0d(line=0.2);
